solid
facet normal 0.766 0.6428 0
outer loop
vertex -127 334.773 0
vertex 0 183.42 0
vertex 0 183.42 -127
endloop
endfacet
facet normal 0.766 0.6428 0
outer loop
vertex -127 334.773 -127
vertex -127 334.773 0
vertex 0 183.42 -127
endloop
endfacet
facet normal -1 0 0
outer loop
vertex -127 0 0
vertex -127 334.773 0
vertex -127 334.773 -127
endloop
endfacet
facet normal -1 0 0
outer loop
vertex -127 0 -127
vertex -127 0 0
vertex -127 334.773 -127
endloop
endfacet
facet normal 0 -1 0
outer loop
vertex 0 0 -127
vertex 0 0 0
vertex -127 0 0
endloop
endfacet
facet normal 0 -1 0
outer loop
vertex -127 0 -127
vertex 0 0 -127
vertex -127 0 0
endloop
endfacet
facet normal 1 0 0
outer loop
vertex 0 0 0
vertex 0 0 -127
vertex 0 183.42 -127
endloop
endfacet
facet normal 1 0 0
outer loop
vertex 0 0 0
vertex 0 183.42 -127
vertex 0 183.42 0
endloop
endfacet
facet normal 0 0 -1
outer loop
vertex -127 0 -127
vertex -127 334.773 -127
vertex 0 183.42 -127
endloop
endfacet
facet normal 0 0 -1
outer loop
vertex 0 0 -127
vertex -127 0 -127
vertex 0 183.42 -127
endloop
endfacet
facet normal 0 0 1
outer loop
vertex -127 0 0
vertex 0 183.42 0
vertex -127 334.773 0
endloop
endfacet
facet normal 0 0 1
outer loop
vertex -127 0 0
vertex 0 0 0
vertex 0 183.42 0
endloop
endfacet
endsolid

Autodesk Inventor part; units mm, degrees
ref_plane "YZ Plane" through (0, 0, 0) normal (1, 0, 0) x (0, 1, 0)
ref_plane "XZ Plane" through (0, 0, 0) normal (0, 1, 0) x (-1, 0, 0)
sketch "Sketch1" plane through (0, 0, 0) normal (0, 1, 0) x (-1, 0, 0)
  line L0 (0, 0) -> (127, 0)
  line L1 (127, 0) -> (127, -127)
  line L2 (127, -127) -> (0, -127)
  line L3 (0, -127) -> (0, 0)
  dimension "d0" = 127
  dimension "d1" = 127
extrude "Extrusion1" add sketch "Sketch1" along normal blind 254
sketch "Sketch2" plane through (0, 254, 0) normal (0, 1, 0) x (1, 0, 0)
  line L0 (-127, 0) -> (0, 0) projected
  line L1 (-127, 127) -> (-127, 0) projected
  line L2 (0, 0) -> (-127, 0)
  line L3 (-127, 0) -> (-127, 127)
  line L4 (-127, 127) -> (0, 127)
  line L5 (0, 127) -> (0, 0)
extrude "Extrusion2" add sketch "Sketch2" along normal blind 127
ref_plane "Work Plane1" through (0, 381, 0) normal (-0.766, -0.6428, 0) x (0, 0, -1)
sketch "Sketch4" plane through (0, 381, 0) normal (-0.766, -0.6428, 0) x (0, 0, -1)
  line L0 (-9.5876, -147.9681) -> (139.0202, -147.9681)
  line L1 (139.0202, -147.9681) -> (139.0202, 162.4304)
  line L2 (139.0202, 162.4304) -> (-9.5876, 162.4304)
  line L3 (-9.5876, 162.4304) -> (-9.5876, -147.9681)
  point P0 (0, 291.8629)
extrude "Extrusion3" cut sketch "Sketch4" along normal blind 127
sketch "Sketch6" plane through (-97.2876, 299.366, 0) normal (0.766, 0.6428, 0) x (0, 0, -1)
  line L0 (127, -151.3527) -> (0, -151.3527) projected
  line L1 (0, 46.2242) -> (127, 46.2242) projected
  line L2 (0, -151.3527) -> (127, -151.3527)
  line L3 (127, -151.3527) -> (127, 46.2242)
  line L4 (127, 46.2242) -> (0, 46.2242)
  line L5 (0, 46.2242) -> (0, -151.3527)
  point P0 (0, -291.8629)
properties part number "NestArmP2-ver1-1111-2021"
